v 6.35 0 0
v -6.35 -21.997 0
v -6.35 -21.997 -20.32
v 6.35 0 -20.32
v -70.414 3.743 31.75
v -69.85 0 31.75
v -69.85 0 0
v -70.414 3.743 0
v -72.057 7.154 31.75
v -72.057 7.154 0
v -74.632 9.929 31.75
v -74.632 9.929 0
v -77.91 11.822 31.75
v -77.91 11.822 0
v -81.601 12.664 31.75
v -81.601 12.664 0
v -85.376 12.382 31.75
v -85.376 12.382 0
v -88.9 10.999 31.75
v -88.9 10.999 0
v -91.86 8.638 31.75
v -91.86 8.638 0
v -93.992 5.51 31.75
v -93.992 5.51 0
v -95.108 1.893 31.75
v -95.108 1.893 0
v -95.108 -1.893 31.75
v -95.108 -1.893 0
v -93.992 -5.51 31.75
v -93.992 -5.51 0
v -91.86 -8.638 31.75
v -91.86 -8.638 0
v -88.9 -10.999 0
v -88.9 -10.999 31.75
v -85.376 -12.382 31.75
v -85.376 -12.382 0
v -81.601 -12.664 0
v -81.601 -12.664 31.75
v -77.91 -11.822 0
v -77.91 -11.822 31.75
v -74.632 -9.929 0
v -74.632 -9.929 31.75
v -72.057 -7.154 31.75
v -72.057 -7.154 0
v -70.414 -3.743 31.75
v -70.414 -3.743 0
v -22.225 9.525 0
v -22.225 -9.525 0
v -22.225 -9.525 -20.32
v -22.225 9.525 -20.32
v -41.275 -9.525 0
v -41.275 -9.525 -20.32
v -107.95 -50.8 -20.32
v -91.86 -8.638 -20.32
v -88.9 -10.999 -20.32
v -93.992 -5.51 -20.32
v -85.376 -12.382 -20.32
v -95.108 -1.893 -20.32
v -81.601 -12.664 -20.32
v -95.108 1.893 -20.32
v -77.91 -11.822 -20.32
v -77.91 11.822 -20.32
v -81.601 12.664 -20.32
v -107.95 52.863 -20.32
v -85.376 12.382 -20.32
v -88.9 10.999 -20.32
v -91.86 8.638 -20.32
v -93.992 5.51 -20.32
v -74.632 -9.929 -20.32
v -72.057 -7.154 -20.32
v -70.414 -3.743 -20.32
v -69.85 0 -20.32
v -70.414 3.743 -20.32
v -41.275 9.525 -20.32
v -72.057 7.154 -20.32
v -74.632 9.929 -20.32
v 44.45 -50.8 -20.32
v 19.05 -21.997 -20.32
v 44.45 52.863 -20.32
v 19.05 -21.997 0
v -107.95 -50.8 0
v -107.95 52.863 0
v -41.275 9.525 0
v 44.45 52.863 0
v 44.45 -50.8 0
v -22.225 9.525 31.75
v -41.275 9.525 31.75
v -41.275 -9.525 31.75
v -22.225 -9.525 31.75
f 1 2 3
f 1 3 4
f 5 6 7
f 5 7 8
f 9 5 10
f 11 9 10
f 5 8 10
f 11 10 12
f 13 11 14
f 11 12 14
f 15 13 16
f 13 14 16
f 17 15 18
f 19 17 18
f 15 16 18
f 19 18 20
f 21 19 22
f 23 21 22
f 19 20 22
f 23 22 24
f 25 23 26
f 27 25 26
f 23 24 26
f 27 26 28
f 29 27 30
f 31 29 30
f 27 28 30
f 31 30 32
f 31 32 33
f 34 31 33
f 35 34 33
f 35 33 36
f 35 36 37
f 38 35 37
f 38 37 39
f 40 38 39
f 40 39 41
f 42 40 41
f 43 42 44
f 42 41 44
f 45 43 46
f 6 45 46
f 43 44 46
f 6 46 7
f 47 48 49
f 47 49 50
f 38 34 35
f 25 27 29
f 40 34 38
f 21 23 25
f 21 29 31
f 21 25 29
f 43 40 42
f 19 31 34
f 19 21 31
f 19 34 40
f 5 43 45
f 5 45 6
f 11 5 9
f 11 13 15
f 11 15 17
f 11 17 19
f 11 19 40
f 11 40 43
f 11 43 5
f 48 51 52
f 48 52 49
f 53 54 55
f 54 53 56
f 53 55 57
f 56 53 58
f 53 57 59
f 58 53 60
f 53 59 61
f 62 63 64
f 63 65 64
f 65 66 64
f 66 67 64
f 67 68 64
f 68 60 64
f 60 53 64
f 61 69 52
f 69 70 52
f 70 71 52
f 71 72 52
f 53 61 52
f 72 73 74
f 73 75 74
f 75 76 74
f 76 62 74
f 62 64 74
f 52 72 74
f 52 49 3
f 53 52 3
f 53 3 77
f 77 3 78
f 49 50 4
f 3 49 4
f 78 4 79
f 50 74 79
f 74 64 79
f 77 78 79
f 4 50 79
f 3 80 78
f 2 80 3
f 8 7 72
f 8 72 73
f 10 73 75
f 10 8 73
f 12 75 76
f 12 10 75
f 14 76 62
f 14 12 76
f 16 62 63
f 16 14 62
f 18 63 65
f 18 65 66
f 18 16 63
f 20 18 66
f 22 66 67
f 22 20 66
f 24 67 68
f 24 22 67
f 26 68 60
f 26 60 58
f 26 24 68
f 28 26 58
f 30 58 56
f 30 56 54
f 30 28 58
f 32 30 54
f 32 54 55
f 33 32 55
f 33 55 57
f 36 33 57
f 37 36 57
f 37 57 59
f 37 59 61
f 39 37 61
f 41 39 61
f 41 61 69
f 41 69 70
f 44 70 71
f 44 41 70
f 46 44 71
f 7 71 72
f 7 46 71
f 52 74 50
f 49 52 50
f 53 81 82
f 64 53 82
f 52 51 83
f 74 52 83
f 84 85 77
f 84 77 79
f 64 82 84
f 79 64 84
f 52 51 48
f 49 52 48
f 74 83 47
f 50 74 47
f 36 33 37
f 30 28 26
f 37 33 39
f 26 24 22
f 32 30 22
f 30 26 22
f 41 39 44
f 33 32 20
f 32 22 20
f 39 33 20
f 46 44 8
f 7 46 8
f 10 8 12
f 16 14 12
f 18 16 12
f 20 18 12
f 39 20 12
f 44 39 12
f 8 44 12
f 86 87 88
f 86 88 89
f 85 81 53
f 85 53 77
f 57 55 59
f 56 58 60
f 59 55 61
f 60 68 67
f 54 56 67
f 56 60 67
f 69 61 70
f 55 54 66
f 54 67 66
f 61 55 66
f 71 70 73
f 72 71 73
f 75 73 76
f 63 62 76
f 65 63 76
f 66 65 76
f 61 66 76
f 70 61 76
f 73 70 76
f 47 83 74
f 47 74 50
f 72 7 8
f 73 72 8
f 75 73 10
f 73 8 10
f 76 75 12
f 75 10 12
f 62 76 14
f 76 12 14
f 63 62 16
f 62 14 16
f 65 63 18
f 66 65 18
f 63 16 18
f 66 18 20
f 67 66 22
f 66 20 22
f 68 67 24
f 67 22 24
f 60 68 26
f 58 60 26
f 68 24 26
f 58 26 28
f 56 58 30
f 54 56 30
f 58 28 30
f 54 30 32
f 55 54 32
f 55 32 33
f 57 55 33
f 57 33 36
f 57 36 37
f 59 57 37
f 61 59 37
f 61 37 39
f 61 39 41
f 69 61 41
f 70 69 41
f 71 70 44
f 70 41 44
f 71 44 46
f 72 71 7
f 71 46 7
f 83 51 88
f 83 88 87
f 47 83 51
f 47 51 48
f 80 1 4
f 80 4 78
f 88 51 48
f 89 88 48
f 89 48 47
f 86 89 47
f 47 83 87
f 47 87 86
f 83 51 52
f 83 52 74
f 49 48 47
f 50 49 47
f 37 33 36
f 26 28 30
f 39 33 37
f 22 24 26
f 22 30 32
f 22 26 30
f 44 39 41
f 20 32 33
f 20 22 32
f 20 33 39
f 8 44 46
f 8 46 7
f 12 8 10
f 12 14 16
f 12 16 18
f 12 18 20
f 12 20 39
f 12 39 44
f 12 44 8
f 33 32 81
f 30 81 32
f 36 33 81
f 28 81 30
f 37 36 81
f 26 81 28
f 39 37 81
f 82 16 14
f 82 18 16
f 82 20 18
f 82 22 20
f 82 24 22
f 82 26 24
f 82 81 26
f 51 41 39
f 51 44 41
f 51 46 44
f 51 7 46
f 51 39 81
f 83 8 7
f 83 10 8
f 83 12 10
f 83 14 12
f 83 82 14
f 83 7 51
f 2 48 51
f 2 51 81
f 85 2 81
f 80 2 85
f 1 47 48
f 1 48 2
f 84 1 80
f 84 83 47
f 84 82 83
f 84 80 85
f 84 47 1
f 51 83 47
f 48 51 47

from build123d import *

# Parameters (mm, degrees)
F0_R     = 12.7
F0_W     = 19.05
F0_H     = 19.05
F1_DEPTH = 31.75
F0_W_2   = 152.4
F0_H_2   = 103.662882
F2_DEPTH = 20.32
F3_DEPTH = 20.32


with BuildPart() as f1:
    # F0 (on Top) → F1 (new body)
    with BuildSketch(Plane.XY):
        with Locations((-82.55, 0)):
            Circle(F0_R)
        with Locations((-31.75, 0)):
            Rectangle(F0_W, F0_H)
    extrude(amount=F1_DEPTH)


with BuildPart() as f2:
    # F0 (on Top) → F2 (new body)
    with BuildSketch(Plane.XY):
        with Locations((-31.75, 1.031441)):
            Rectangle(F0_W_2, F0_H_2)
        with Locations((-82.55, 0)):
            Circle(F0_R, mode=Mode.SUBTRACT)
        with Locations((-31.75, 0)):
            Rectangle(F0_W, F0_H, mode=Mode.SUBTRACT)
        Polygon((-6.35, -21.997045), (6.35, 0), (19.05, -21.997045), align=None, mode=Mode.SUBTRACT)
    extrude(amount=-F2_DEPTH)


with BuildPart() as f3:
    # F0 (on Top) → F3 (new body)
    with BuildSketch(Plane.XY):
        with Locations((-82.55, 0)):
            Circle(F0_R)
        with Locations((-31.75, 0)):
            Rectangle(F0_W, F0_H)
    extrude(amount=-F3_DEPTH)


solid = Compound([f1.part, f2.part, f3.part])
